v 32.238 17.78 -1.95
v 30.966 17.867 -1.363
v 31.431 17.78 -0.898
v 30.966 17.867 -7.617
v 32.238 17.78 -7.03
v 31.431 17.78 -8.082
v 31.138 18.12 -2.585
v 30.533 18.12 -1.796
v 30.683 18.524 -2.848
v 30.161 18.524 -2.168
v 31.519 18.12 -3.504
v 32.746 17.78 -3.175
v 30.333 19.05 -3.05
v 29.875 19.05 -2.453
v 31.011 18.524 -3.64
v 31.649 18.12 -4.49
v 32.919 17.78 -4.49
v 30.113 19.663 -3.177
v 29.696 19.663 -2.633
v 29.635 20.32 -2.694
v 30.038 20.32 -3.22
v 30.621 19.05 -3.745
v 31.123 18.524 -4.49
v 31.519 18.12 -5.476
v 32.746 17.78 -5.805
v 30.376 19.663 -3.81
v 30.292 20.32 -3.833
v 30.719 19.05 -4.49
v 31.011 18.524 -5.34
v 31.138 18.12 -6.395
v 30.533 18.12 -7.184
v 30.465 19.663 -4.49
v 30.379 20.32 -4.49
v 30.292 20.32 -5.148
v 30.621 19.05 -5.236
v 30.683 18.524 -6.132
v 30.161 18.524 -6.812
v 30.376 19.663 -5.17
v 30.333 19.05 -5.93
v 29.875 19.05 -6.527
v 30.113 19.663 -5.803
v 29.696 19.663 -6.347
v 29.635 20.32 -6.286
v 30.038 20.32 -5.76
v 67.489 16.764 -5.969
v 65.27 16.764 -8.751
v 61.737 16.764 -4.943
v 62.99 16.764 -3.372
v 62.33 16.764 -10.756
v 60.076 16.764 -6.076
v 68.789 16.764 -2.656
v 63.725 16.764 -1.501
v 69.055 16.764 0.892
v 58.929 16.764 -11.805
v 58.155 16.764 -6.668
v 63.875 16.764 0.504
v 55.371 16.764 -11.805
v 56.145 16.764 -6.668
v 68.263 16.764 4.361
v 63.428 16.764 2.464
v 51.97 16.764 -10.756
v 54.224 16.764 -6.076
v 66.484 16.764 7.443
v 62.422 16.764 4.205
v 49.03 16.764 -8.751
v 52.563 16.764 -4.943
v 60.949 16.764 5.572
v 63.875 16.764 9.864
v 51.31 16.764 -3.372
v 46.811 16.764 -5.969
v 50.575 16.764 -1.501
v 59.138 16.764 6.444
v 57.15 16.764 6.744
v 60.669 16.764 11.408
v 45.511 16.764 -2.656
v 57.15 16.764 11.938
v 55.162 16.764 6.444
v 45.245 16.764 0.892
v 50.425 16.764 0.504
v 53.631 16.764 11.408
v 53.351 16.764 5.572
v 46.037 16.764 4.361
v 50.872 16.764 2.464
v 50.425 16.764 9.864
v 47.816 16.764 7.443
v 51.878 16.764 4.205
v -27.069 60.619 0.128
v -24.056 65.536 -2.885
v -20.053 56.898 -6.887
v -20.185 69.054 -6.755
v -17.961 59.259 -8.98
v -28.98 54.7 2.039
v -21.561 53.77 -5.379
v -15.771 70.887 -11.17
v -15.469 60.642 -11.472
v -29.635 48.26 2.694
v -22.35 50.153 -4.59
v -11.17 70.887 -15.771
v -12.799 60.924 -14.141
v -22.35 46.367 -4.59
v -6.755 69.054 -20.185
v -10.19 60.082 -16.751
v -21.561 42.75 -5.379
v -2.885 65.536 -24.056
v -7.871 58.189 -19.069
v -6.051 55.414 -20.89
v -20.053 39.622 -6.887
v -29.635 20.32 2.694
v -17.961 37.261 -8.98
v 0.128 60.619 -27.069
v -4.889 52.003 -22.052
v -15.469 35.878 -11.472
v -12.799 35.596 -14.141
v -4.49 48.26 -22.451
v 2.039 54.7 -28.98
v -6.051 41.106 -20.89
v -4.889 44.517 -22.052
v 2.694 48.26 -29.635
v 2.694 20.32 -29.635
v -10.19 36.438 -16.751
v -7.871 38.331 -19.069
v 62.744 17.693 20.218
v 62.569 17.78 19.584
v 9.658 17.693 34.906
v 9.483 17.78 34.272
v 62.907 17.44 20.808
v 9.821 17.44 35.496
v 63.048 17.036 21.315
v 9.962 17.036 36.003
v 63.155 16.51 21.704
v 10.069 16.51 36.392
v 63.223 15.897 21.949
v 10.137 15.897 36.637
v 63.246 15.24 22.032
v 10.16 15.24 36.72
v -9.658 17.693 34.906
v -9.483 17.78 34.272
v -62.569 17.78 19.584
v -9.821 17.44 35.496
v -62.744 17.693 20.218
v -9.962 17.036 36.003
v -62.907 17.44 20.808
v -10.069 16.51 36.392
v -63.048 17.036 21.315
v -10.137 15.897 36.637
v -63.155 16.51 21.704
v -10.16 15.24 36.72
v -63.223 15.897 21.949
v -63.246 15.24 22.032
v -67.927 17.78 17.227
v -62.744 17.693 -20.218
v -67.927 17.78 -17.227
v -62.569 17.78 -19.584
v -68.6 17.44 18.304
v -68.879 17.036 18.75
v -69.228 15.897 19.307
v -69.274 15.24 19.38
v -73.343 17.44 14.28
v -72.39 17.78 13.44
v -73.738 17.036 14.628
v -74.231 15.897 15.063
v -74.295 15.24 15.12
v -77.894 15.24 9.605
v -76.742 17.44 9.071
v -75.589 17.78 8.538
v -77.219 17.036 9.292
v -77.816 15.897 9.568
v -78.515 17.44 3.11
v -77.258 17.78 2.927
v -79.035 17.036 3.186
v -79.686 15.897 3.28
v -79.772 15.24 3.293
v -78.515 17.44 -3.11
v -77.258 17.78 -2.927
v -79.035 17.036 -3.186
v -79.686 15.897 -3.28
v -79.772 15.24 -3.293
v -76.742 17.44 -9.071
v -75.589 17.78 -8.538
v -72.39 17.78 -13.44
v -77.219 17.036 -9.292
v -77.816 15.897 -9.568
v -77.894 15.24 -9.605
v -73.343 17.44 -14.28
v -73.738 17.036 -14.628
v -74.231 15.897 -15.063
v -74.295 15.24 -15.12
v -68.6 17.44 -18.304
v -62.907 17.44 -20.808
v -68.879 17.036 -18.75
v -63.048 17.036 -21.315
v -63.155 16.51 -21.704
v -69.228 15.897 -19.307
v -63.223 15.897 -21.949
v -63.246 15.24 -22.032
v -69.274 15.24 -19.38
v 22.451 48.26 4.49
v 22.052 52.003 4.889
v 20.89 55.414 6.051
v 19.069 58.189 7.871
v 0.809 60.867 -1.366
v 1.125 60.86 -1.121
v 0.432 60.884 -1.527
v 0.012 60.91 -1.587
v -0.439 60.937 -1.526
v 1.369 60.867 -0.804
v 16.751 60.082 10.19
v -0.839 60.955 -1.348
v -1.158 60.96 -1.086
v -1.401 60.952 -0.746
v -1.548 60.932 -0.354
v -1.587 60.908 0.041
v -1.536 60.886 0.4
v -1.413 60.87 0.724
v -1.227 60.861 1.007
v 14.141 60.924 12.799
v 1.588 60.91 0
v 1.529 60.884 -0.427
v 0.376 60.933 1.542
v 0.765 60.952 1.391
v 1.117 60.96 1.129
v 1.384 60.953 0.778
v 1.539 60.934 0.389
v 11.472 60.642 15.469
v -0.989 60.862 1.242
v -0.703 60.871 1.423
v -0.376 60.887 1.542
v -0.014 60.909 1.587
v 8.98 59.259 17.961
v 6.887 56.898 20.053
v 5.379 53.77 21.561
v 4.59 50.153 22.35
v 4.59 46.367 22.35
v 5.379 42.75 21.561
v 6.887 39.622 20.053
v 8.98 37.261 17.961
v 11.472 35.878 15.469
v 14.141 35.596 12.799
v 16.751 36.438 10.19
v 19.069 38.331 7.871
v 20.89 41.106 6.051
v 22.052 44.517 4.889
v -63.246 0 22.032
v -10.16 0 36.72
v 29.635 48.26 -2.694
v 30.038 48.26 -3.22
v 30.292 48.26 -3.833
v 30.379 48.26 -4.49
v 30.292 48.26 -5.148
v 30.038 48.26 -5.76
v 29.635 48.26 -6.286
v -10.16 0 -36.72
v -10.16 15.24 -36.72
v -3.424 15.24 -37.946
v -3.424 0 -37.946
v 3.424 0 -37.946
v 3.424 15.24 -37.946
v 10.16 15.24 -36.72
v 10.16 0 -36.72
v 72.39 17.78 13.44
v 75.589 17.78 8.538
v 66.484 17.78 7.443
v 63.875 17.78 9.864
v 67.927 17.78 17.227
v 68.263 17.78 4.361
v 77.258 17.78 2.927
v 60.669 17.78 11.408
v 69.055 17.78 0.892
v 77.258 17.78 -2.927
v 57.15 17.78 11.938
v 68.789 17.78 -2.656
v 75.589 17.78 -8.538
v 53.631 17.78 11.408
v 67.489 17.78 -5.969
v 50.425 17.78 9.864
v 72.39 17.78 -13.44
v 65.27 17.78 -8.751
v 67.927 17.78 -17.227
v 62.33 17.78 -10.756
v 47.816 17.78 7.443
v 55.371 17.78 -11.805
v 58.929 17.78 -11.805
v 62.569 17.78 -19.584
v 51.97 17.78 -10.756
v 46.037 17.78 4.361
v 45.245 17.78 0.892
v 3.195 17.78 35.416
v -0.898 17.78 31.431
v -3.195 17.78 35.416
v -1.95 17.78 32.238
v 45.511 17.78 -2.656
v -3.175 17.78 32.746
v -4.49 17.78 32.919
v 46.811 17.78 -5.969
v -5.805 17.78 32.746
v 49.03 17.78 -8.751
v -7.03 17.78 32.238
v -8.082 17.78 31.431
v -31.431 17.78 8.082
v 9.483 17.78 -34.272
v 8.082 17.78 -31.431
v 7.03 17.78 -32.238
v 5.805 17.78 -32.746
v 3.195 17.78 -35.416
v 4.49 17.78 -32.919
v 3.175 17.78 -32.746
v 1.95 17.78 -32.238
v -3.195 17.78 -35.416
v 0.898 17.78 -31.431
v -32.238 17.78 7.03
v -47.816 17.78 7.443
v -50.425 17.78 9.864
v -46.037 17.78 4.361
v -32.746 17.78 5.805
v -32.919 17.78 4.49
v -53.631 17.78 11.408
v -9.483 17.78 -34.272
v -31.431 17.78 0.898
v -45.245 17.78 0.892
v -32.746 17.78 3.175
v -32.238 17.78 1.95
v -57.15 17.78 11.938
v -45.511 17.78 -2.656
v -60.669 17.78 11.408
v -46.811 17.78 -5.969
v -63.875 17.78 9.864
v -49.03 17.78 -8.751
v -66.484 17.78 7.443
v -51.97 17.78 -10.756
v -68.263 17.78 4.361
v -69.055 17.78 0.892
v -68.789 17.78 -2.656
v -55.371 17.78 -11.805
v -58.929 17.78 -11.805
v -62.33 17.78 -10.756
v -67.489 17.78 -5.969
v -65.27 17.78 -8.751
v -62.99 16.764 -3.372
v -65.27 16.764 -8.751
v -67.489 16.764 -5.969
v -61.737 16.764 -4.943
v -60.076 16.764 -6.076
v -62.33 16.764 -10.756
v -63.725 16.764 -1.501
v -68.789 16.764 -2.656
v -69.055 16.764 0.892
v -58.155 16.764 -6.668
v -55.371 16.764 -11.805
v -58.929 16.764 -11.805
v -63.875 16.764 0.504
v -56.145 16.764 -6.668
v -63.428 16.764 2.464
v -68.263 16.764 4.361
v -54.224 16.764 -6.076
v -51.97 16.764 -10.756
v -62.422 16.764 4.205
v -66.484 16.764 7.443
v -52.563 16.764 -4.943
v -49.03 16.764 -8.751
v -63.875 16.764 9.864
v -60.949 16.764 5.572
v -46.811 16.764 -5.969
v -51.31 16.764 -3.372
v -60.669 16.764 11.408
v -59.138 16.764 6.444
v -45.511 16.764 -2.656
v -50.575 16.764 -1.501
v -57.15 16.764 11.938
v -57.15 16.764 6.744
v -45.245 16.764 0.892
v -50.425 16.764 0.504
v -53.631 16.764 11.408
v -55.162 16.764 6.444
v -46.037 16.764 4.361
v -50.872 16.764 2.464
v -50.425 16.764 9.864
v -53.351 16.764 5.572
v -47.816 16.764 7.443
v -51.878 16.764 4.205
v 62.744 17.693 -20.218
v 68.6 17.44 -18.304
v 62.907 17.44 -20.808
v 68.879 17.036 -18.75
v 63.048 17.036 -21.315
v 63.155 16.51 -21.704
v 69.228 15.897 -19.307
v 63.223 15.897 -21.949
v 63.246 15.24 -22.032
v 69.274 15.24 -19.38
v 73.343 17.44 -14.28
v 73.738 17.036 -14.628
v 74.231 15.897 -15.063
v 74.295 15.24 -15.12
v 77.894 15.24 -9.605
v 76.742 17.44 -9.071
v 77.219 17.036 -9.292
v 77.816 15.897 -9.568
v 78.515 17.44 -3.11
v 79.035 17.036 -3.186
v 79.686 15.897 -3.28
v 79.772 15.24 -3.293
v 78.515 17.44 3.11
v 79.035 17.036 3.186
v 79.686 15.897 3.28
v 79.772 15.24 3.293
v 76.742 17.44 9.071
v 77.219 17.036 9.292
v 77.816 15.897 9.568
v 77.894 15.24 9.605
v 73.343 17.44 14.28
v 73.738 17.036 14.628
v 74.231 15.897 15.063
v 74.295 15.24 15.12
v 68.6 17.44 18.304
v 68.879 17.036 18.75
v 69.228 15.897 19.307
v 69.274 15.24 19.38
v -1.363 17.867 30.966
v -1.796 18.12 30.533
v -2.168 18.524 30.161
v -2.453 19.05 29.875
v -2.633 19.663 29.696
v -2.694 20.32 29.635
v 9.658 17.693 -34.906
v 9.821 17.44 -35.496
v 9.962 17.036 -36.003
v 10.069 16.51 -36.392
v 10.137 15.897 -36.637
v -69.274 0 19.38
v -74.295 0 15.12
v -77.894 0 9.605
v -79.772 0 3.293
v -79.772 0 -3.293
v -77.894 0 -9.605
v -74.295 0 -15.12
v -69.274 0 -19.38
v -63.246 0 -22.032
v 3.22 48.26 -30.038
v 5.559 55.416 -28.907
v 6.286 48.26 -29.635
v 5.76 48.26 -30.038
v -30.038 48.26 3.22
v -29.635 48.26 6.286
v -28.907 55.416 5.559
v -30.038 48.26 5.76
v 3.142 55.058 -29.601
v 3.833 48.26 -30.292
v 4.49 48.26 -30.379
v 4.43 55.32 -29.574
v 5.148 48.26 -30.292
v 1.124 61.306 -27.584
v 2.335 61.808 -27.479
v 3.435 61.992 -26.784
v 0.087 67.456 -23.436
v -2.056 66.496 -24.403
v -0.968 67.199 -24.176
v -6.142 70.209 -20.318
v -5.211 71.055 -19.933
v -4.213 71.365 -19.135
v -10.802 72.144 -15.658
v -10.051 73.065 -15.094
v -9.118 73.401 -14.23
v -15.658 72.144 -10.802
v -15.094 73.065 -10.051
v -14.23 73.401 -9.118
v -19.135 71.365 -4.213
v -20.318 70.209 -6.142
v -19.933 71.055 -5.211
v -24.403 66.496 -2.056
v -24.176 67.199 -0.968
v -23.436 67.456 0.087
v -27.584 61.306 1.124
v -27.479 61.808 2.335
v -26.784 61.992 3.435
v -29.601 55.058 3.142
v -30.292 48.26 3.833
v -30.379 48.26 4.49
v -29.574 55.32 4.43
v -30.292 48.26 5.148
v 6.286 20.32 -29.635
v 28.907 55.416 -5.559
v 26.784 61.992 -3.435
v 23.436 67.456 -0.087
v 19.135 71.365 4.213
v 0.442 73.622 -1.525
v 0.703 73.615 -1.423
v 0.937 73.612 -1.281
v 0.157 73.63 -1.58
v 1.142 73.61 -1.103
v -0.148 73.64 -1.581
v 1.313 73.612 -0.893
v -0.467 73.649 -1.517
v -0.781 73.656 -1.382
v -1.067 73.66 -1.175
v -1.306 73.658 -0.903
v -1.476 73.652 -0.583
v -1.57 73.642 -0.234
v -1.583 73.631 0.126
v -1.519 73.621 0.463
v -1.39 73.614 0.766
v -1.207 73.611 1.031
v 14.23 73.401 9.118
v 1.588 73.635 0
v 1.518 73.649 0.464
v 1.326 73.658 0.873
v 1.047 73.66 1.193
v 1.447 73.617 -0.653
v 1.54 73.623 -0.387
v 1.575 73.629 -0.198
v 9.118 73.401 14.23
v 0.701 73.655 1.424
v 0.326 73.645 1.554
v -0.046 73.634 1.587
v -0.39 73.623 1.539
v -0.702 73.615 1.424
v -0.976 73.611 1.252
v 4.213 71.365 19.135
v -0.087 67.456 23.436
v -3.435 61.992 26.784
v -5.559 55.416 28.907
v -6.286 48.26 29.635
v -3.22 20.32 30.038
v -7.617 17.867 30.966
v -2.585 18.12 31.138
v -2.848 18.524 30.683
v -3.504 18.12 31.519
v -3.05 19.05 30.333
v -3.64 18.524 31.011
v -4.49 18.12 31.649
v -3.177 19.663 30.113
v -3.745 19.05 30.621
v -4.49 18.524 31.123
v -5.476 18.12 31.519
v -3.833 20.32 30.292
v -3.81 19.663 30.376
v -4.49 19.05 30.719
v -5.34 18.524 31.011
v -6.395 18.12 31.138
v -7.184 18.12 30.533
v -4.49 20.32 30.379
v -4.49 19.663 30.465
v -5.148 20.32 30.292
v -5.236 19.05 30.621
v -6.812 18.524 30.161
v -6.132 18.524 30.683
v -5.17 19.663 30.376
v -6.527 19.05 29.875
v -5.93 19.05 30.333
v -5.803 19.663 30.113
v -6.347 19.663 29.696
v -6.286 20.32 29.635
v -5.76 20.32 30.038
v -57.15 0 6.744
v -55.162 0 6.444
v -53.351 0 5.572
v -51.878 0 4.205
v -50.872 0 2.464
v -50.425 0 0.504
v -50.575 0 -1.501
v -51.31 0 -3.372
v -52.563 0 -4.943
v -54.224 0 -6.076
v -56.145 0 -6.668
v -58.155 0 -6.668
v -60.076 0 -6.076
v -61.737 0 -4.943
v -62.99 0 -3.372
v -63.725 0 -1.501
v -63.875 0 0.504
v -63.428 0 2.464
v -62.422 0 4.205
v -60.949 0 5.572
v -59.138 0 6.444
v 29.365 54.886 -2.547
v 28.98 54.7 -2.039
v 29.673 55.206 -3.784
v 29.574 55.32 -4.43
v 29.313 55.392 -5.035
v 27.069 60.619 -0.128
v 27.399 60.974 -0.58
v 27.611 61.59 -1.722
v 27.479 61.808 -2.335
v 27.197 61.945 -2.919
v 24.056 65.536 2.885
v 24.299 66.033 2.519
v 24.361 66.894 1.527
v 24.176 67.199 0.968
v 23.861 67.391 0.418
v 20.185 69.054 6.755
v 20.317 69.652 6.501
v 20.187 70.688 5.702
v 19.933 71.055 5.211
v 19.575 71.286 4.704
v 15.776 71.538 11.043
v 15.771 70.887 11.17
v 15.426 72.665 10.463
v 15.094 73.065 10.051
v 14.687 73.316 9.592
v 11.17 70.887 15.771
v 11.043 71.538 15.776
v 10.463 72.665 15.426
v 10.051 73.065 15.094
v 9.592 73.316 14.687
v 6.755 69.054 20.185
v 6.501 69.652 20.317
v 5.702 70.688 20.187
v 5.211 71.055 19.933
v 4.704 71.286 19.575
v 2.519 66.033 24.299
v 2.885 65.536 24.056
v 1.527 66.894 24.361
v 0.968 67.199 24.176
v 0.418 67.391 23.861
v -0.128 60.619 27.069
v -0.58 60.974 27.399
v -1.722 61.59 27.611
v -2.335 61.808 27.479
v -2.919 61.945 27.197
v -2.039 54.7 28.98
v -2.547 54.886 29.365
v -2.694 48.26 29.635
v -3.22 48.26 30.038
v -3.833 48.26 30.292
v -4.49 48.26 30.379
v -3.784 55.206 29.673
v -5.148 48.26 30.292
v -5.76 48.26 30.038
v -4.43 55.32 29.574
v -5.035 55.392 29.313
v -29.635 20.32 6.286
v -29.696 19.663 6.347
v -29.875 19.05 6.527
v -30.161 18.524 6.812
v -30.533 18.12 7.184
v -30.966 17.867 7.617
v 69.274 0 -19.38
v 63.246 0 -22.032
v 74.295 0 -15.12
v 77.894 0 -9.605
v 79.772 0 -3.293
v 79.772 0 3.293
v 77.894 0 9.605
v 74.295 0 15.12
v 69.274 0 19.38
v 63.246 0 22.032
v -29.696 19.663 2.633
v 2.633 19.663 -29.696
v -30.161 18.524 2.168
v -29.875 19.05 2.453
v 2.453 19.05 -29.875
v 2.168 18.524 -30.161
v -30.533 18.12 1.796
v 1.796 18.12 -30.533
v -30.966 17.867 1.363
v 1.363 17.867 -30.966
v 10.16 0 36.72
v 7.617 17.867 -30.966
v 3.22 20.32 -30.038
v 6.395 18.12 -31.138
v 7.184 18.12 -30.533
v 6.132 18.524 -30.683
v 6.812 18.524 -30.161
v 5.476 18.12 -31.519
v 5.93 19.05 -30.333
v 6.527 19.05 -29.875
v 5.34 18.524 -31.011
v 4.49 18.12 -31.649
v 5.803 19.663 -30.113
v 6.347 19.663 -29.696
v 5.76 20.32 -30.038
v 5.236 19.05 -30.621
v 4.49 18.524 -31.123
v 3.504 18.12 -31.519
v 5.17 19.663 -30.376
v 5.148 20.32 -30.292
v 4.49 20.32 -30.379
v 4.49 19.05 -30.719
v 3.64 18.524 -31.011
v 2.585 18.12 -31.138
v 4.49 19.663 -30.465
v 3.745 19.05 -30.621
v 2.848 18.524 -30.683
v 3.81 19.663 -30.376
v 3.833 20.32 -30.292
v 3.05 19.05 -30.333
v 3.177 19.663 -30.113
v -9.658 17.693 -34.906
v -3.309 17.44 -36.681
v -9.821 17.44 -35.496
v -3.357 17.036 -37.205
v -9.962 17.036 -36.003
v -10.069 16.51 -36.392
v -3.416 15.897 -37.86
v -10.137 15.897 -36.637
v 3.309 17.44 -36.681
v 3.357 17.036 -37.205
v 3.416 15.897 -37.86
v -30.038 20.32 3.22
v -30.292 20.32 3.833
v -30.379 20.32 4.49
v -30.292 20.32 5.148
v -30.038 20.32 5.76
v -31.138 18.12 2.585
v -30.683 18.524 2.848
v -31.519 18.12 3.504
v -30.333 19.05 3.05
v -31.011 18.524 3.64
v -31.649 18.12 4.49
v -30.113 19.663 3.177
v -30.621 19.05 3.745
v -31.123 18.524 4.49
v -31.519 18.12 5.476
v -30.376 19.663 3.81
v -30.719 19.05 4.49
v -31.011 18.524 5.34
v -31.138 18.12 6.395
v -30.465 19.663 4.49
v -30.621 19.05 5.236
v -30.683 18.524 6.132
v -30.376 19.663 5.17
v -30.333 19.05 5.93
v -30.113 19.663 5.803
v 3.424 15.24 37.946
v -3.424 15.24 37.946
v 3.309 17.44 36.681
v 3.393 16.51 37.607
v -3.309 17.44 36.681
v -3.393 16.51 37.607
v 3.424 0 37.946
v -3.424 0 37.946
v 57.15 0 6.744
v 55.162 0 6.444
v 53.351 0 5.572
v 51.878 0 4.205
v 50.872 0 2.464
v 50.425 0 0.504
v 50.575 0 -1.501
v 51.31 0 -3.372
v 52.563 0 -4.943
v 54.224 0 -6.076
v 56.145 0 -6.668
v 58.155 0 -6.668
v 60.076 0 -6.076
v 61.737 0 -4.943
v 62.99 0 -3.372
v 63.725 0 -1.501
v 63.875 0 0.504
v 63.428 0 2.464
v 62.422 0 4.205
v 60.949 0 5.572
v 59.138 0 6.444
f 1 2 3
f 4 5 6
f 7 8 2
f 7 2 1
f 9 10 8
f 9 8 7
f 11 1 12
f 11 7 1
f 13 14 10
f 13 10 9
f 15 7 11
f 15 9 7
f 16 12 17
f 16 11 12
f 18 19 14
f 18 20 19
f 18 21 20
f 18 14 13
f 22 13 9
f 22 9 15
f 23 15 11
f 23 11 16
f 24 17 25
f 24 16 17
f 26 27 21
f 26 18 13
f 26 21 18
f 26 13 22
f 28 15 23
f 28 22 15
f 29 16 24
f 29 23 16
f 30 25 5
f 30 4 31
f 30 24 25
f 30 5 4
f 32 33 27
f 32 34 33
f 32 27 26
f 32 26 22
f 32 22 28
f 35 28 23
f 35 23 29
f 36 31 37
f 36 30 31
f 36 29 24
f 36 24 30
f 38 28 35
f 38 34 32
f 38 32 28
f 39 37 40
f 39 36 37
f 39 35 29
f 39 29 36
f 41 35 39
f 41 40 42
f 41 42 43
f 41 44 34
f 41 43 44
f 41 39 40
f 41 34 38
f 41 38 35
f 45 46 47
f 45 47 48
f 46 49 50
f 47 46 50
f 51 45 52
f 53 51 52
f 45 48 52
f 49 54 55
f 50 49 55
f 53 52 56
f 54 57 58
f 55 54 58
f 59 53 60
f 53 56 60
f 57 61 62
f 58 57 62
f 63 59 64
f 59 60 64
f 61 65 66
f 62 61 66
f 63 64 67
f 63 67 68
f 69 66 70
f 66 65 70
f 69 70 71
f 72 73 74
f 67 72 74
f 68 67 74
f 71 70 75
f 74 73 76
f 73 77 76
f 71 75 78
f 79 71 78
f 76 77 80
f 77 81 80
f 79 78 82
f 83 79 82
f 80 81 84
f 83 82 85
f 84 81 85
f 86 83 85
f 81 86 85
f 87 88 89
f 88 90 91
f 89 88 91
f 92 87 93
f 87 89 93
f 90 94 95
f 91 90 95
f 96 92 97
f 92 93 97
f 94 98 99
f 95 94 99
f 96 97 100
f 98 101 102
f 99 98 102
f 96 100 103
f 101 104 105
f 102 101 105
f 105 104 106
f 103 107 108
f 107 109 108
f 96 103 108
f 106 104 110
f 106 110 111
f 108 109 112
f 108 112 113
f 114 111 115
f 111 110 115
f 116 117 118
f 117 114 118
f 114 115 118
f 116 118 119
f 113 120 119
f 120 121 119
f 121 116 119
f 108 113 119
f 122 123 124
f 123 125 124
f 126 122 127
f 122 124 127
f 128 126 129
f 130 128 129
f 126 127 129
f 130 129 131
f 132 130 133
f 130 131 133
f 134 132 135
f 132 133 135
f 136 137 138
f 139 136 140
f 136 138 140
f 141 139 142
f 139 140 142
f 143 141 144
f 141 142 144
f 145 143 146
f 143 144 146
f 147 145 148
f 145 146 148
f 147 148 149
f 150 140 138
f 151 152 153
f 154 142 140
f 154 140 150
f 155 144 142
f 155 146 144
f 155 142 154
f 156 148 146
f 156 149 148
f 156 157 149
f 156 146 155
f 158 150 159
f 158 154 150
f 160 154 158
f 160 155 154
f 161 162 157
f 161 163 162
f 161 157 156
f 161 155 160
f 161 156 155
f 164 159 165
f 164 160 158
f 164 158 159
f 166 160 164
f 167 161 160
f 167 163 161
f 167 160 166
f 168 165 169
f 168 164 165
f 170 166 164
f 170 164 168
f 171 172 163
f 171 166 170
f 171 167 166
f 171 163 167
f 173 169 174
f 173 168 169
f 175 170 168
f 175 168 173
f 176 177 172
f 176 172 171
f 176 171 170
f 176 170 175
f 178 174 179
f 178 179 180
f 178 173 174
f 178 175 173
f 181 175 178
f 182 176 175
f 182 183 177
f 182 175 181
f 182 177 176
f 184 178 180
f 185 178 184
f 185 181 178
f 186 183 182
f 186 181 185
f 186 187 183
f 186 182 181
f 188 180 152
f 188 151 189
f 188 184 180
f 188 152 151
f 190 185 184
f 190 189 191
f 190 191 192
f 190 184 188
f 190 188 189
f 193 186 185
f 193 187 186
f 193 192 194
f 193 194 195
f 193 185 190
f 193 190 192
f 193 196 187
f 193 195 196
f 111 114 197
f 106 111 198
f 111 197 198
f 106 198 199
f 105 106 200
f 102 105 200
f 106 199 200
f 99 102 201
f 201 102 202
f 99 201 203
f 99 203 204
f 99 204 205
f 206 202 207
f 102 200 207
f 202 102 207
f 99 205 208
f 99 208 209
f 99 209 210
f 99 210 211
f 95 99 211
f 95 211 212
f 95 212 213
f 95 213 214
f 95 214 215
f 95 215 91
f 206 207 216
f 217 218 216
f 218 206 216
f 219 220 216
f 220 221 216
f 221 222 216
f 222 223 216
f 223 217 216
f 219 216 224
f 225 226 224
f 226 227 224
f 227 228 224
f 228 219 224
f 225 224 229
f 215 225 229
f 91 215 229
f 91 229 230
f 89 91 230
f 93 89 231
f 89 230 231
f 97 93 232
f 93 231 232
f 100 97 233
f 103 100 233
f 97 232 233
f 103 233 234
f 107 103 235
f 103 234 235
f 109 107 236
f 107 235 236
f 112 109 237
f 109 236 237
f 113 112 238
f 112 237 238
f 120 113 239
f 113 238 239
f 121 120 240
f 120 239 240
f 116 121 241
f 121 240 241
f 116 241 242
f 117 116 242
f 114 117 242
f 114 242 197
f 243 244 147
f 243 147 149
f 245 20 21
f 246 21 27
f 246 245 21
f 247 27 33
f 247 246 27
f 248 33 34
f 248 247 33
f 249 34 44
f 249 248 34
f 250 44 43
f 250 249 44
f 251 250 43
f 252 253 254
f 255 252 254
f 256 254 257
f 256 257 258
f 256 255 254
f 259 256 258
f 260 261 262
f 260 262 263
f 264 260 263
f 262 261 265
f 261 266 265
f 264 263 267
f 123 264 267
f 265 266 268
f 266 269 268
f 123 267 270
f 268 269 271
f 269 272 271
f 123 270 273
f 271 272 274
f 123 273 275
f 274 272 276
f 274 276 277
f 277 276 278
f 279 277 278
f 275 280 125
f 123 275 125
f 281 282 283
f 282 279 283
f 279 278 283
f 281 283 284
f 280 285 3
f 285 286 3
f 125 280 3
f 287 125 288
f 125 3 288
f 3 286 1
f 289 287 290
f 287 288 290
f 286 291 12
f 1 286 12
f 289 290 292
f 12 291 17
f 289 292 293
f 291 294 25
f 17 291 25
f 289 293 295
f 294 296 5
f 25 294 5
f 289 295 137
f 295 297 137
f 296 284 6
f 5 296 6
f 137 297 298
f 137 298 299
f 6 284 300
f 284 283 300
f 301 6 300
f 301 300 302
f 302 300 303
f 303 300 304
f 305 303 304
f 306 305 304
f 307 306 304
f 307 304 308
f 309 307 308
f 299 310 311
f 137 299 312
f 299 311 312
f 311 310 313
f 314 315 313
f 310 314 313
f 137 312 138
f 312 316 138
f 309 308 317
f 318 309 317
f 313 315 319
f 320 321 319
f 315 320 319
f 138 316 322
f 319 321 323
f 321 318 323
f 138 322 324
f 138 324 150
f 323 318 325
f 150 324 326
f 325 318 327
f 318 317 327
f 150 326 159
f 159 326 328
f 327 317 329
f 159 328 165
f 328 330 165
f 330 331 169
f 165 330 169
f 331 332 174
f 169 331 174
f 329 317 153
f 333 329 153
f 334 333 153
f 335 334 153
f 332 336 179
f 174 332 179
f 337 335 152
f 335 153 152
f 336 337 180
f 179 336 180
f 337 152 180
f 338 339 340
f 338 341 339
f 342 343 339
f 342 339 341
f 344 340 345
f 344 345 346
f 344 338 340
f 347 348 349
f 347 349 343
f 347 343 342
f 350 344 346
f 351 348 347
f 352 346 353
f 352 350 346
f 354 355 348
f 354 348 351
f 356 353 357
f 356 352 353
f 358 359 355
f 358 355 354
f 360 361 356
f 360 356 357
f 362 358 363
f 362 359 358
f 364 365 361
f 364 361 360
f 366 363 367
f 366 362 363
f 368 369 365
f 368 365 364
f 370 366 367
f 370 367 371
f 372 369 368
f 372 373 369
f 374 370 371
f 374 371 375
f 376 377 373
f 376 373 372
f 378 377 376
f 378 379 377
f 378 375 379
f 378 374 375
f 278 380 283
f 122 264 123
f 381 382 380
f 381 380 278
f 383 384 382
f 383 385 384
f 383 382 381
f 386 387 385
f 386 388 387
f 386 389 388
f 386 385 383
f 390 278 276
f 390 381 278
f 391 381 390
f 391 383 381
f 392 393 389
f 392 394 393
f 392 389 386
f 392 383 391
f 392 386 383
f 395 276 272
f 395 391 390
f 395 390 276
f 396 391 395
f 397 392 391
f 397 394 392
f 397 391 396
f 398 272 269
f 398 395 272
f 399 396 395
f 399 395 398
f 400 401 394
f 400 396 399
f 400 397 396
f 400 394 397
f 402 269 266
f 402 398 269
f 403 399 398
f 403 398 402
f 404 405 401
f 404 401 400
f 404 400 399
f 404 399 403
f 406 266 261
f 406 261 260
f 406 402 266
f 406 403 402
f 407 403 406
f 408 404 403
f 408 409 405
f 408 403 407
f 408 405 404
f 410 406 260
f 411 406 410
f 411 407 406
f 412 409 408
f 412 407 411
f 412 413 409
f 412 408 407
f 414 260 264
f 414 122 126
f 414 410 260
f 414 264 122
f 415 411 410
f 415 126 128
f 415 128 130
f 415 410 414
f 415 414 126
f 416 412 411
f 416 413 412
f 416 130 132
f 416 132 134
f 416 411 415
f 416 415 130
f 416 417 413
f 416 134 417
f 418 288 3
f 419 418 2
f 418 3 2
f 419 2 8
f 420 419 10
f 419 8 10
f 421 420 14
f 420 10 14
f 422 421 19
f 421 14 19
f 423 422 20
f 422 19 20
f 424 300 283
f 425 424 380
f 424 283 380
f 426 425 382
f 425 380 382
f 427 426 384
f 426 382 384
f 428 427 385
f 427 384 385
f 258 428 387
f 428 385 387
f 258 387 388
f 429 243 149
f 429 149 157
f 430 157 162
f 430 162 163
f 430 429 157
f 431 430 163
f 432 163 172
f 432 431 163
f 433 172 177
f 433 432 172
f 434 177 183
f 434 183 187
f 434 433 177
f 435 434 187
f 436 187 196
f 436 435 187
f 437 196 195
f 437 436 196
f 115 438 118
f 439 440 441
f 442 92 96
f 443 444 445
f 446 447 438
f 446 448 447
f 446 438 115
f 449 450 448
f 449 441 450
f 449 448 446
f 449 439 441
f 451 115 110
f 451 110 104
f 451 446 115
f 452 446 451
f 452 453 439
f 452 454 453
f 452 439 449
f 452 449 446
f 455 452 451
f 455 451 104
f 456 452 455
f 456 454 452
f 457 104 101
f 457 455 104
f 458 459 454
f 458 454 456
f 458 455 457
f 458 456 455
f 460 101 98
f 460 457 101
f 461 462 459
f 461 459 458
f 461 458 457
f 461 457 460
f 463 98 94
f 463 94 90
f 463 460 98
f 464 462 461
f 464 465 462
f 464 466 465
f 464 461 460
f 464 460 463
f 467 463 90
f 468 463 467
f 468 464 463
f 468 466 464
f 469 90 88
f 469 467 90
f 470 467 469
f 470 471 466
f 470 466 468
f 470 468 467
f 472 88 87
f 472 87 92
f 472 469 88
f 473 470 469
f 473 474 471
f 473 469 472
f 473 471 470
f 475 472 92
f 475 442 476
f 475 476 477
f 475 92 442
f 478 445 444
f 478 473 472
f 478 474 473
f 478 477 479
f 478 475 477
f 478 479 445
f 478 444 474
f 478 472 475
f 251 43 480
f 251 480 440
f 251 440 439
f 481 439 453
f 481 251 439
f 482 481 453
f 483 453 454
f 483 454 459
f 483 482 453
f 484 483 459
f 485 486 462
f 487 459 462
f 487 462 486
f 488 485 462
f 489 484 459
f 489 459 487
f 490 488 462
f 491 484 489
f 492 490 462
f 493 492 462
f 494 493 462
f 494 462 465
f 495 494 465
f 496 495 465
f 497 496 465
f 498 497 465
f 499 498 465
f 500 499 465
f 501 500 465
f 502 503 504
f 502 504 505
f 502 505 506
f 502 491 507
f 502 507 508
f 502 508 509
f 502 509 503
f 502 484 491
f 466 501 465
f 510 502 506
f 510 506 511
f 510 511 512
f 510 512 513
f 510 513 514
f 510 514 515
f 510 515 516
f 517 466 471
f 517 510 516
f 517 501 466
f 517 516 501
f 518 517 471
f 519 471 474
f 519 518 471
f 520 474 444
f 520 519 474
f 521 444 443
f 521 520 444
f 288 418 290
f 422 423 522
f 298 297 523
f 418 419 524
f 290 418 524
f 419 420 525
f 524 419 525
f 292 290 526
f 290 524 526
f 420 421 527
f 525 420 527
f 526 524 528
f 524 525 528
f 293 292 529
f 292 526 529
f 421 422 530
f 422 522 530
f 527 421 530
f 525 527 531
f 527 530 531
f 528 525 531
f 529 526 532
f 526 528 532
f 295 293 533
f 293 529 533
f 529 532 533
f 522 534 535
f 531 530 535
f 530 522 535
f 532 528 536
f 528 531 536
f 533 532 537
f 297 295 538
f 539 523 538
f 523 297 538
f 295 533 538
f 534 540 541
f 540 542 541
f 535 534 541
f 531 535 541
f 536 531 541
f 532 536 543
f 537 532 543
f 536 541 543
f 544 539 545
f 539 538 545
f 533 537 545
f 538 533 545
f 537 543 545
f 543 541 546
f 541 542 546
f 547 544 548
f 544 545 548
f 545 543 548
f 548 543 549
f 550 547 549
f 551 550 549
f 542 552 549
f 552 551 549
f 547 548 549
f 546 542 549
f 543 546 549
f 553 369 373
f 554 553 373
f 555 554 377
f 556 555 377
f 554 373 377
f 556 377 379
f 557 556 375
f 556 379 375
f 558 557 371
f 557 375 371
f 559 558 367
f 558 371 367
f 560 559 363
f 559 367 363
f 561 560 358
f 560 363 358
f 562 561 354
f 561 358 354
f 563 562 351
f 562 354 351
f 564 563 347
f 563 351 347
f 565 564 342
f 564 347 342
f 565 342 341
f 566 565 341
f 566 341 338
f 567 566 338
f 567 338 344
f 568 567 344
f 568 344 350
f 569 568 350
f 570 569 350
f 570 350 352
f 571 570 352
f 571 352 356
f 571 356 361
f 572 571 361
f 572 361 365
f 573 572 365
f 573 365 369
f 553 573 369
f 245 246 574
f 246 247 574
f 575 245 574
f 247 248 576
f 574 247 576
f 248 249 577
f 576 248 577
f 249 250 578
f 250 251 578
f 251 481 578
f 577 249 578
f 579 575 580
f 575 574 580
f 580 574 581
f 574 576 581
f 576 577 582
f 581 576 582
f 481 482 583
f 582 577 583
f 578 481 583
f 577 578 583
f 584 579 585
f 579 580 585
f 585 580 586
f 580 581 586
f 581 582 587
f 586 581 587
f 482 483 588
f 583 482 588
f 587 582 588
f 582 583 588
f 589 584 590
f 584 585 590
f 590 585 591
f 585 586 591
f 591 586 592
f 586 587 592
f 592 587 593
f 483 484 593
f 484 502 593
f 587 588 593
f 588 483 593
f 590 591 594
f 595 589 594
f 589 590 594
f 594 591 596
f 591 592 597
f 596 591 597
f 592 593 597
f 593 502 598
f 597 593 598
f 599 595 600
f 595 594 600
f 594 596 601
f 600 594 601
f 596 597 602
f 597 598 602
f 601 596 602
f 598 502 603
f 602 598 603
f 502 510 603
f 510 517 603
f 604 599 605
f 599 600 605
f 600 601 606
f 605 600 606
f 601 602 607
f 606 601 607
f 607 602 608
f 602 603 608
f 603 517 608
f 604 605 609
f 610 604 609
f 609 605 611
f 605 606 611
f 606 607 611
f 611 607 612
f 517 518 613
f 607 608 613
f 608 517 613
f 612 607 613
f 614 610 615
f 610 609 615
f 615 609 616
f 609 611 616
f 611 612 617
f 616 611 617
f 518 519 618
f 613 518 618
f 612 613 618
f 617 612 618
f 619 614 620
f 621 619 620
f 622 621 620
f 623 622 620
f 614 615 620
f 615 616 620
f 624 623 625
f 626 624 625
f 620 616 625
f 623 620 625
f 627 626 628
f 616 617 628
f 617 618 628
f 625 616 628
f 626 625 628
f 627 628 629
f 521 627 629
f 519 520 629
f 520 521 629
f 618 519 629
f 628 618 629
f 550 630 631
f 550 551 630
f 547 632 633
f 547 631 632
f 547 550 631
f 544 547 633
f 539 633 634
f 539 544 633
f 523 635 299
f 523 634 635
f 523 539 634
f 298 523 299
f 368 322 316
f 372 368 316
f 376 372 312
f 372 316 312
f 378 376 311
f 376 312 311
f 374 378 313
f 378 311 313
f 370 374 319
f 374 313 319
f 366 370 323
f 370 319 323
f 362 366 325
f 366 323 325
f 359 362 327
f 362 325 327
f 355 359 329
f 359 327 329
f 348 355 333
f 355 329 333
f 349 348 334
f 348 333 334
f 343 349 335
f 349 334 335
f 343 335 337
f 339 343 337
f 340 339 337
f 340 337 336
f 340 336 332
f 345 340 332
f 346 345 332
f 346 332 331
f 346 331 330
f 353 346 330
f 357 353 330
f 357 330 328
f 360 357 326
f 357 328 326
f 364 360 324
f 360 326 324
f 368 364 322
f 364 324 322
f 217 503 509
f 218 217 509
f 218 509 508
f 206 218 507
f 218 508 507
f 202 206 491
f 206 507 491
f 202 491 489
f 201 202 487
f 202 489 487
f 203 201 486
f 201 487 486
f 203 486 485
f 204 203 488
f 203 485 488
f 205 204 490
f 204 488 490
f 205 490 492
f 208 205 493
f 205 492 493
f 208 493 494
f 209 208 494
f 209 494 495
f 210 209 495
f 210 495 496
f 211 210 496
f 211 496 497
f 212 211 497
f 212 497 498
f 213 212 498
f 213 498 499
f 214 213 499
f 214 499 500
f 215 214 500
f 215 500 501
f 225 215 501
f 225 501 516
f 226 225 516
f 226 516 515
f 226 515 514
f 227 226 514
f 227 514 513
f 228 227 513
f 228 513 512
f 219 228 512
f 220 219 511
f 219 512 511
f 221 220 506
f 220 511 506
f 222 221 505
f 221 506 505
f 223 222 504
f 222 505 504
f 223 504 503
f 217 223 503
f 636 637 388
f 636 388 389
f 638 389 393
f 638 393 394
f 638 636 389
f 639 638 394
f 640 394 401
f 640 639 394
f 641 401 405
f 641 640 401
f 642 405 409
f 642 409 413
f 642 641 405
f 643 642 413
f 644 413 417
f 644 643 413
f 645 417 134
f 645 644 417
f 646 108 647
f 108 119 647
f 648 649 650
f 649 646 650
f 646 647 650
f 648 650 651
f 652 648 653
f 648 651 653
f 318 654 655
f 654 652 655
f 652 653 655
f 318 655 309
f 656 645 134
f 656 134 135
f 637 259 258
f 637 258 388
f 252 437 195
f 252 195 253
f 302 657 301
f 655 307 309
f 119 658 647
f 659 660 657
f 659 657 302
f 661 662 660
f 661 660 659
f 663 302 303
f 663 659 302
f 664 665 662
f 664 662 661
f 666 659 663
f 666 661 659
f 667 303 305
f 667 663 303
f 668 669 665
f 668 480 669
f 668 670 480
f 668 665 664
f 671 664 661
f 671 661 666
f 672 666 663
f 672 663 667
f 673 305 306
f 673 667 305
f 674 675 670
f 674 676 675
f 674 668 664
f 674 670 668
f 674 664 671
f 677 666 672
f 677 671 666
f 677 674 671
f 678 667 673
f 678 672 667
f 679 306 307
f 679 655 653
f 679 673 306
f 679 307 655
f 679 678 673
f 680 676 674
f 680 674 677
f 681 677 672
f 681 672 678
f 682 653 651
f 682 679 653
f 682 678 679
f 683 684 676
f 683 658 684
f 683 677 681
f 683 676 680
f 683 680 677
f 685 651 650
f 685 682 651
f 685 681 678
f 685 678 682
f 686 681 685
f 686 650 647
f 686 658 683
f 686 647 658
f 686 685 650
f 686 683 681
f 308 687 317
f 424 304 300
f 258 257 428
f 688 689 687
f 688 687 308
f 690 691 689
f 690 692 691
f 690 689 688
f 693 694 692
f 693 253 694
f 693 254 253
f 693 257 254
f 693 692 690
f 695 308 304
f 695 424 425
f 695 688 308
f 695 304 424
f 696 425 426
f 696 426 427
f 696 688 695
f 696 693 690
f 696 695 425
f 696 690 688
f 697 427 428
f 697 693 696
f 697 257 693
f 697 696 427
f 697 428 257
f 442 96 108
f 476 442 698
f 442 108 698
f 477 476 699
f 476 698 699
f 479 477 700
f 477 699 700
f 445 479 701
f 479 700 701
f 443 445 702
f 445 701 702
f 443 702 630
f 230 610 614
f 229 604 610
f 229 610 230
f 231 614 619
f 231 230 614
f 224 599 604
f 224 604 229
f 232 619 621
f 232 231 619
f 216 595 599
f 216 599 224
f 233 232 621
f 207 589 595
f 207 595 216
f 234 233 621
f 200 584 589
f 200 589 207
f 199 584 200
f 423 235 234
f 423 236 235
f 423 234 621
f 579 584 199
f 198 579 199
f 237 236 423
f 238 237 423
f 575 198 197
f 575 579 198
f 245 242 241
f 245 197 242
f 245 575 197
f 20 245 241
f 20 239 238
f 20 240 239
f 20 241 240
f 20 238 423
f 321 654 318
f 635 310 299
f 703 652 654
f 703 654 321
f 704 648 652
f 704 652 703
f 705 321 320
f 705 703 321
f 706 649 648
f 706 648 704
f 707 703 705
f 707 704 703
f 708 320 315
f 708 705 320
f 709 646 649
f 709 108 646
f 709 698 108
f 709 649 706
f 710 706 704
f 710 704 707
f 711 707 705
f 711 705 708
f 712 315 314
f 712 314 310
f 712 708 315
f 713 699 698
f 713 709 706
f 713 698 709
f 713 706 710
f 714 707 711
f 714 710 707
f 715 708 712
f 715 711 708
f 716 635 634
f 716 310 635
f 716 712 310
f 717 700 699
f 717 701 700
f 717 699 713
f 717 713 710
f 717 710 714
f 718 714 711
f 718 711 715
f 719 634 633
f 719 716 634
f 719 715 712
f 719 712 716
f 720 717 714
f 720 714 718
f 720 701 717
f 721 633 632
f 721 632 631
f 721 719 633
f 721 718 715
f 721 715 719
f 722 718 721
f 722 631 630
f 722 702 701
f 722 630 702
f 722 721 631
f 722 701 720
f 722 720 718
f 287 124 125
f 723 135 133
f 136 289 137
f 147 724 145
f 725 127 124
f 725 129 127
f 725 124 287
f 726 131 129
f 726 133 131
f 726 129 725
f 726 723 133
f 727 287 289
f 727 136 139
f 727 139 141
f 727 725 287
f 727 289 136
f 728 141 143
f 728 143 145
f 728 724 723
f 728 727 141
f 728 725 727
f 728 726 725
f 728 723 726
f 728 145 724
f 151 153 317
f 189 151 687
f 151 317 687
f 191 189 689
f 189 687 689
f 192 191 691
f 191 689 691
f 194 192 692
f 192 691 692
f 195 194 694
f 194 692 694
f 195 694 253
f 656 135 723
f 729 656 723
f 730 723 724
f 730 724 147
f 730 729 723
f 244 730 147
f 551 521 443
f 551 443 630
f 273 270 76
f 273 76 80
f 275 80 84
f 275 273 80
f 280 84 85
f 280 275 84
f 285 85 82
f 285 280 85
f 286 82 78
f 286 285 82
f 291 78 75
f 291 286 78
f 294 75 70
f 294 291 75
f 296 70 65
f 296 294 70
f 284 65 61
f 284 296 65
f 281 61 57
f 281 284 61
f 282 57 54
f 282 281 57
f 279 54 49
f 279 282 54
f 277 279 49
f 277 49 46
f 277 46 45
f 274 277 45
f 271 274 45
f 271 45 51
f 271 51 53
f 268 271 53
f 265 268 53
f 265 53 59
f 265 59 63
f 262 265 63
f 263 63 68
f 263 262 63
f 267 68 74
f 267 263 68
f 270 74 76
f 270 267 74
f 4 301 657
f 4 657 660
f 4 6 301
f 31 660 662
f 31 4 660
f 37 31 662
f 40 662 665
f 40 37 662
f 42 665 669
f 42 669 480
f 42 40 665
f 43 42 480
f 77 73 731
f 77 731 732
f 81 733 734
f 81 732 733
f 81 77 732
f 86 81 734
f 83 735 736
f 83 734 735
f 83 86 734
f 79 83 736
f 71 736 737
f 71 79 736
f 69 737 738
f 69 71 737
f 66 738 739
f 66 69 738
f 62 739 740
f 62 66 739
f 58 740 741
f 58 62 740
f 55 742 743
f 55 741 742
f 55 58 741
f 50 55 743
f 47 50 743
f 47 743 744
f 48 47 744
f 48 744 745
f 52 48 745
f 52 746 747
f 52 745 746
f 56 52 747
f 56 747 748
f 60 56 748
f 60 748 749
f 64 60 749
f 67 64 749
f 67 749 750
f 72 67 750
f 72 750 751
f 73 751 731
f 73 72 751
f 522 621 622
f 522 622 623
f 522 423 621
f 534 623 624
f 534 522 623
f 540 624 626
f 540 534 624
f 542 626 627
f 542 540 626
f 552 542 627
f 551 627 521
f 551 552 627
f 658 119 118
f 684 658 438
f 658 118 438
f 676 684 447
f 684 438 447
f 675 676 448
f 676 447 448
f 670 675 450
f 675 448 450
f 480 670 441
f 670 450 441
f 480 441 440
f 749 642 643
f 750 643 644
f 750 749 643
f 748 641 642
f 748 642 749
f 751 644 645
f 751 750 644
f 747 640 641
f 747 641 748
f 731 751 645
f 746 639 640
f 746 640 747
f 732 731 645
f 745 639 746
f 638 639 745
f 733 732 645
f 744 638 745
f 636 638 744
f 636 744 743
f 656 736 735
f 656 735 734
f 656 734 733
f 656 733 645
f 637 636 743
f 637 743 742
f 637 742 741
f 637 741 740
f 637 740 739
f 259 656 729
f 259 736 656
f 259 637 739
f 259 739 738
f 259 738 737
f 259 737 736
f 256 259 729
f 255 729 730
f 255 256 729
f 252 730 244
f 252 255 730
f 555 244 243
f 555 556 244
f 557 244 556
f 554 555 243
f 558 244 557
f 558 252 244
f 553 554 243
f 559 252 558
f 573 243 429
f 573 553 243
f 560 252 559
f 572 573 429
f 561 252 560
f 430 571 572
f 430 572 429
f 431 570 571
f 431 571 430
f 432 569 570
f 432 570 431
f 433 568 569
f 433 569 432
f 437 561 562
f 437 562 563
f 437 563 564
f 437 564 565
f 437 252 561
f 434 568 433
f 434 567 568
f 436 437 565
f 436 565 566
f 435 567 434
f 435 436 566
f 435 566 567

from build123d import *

# Parameters (mm, degrees)
BOSS_EXTRUDE2_DEPTH                = 17.78
SKETCH2_R                          = 6.7437
CUT_EXTRUDE1_DEPTH                 = 91.384393011
SKETCH3_R                          = 11.938
CUT_EXTRUDE2_DEPTH                 = 1.016
BOSS_EXTRUDE3_DEPTH                = 19.05
BOSS_EXTRUDE3_DEPTH_BACK           = 19.05
SKETCH9_R                          = 12.7
CUT_EXTRUDE5_DEPTH                 = 130.70690942
F_1_8_0_125_DIAMETER_HOLE14_REACH  = 117.235
F_1_8_0_125_DIAMETER_HOLE14_BORE_R = 1.5875
FILLET1_R                          = 2.54


with BuildPart() as part:
    # Sketch1 → Boss-Extrude2 (new body)
    with BuildSketch(Plane(origin=(0, 0, 0), x_dir=(1, 0, 0), z_dir=(0, 1, 0))):
        with BuildLine():
            Line((-63.246, 22.032212417), (-10.16, 36.720354029))
            ThreePointArc((-10.16, 36.720354029), (0, 38.1), (10.16, 36.720354029))
            Line((10.16, 36.720354029), (63.246, 22.032212417))
            ThreePointArc((63.246, 22.032212417), (80.01, 0), (63.246, -22.032212417))
            Line((63.246, -22.032212417), (10.16, -36.720354029))
            ThreePointArc((10.16, -36.720354029), (0, -38.1), (-10.16, -36.720354029))
            Line((-10.16, -36.720354029), (-63.246, -22.032212417))
            ThreePointArc((-63.246, -22.032212417), (-80.01, 0), (-63.246, 22.032212417))
        make_face()
    extrude(amount=BOSS_EXTRUDE2_DEPTH)

    # Sketch2 → Cut-Extrude1 (cut, through all)
    with BuildSketch(Plane(origin=(0, 17.78, 0), x_dir=(1, 0, 0), z_dir=(0, 1, 0))):
        with Locations(Location((-57.15, 0, 0), (0, 0, 270))):
            Circle(SKETCH2_R)
    cut_extrude1 = extrude(amount=-CUT_EXTRUDE1_DEPTH, mode=Mode.SUBTRACT)

    # Sketch3 → Cut-Extrude2 (cut)
    with BuildSketch(Plane(origin=(0, 17.78, 0), x_dir=(1, 0, 0), z_dir=(0, 1, 0))):
        with Locations(Location((-57.15, 0, 0), (0, 0, 270))):
            Circle(SKETCH3_R)
    cut_extrude2 = extrude(amount=-CUT_EXTRUDE2_DEPTH, mode=Mode.SUBTRACT)

    # Mirror1: Cut-Extrude1, Cut-Extrude2 across plane
    add(cut_extrude1.mirror(Plane(origin=(0, 0, 0), x_dir=(0, 0, 1), z_dir=(1, 0, 0))), mode=Mode.SUBTRACT)
    add(cut_extrude2.mirror(Plane(origin=(0, 0, 0), x_dir=(0, 0, 1), z_dir=(1, 0, 0))), mode=Mode.SUBTRACT)

    # Sketch8 → Boss-Extrude3 (add, two sides)
    with BuildSketch(Plane(origin=(0, 0, 0), x_dir=(0, -1, 0), z_dir=(0.7071067811865464, 0, 0.7071067811865488))) as boss_extrude3_sk:
        with BuildLine():
            Line((-48.26, -25.4), (-17.78, -25.4))
            Line((-17.78, -25.4), (-17.78, 25.4))
            Line((-17.78, 25.4), (-48.26, 25.4))
            ThreePointArc((-48.26, 25.4), (-73.66, 0), (-48.26, -25.4))
        make_face()
    extrude(amount=BOSS_EXTRUDE3_DEPTH)
    extrude(boss_extrude3_sk.sketch, amount=-BOSS_EXTRUDE3_DEPTH_BACK)

    # Sketch9 → Cut-Extrude5 (cut, through all)
    with BuildSketch(Plane(origin=(13.470384182, 0, 13.470384182), x_dir=(0.7071067811865487, 0, -0.7071067811865465), z_dir=(0.7071067811865465, 0, 0.7071067811865487))):
        with Locations((0, 48.26)):
            Circle(SKETCH9_R)
    extrude(amount=-CUT_EXTRUDE5_DEPTH, mode=Mode.SUBTRACT)

    # 1/8 (0.125) Diameter Hole14 bore → 1/8 (0.125) Diameter Hole14 (cut, up to next)
    with BuildSketch(Plane(origin=(0, 73.66, 0), x_dir=(1, 0, 0), z_dir=(0, 1, 0)), mode=Mode.PRIVATE) as f_1_8_0_125_diameter_hole14_sk1:
        Circle(F_1_8_0_125_DIAMETER_HOLE14_BORE_R)
    f_1_8_0_125_diameter_hole14_tool1 = extrude(f_1_8_0_125_diameter_hole14_sk1.sketch, amount=-F_1_8_0_125_DIAMETER_HOLE14_REACH, mode=Mode.PRIVATE) & part.part
    add(f_1_8_0_125_diameter_hole14_tool1.solids().sort_by_distance((0, 73.66, 0))[0], mode=Mode.SUBTRACT)

    # Fillet1
    fillet1_edges = [part.edges().sort_by_distance(p)[0] for p in [
        (0, 17.78, 38.1),
        (36.703, 17.78, 29.376283223),
        (80.01, 17.78, 0),
        (36.703, 17.78, -29.376283223),
        (0, 17.78, -38.1),
        (-36.703, 17.78, -29.376283223),
        (-80.01, 17.78, 0),
        (4.490128061, 33.02, -31.430896424),
        (17.960512242, 17.78, -17.960512242),
        (-13.470384182, 17.78, -13.470384182),
        (-17.960512242, 17.78, 17.960512242),
        (-31.430896424, 33.02, 4.490128061),
        (-13.470384182, 73.66, -13.470384182),
        (31.430896424, 33.02, -4.490128061),
        (13.470384182, 73.66, 13.470384182),
        (-4.490128061, 33.02, 31.430896424),
        (13.470384182, 17.78, 13.470384182),
        (-36.703, 17.78, 29.376283223),
    ]]
    fillet(fillet1_edges, radius=FILLET1_R)


solid = part.part
